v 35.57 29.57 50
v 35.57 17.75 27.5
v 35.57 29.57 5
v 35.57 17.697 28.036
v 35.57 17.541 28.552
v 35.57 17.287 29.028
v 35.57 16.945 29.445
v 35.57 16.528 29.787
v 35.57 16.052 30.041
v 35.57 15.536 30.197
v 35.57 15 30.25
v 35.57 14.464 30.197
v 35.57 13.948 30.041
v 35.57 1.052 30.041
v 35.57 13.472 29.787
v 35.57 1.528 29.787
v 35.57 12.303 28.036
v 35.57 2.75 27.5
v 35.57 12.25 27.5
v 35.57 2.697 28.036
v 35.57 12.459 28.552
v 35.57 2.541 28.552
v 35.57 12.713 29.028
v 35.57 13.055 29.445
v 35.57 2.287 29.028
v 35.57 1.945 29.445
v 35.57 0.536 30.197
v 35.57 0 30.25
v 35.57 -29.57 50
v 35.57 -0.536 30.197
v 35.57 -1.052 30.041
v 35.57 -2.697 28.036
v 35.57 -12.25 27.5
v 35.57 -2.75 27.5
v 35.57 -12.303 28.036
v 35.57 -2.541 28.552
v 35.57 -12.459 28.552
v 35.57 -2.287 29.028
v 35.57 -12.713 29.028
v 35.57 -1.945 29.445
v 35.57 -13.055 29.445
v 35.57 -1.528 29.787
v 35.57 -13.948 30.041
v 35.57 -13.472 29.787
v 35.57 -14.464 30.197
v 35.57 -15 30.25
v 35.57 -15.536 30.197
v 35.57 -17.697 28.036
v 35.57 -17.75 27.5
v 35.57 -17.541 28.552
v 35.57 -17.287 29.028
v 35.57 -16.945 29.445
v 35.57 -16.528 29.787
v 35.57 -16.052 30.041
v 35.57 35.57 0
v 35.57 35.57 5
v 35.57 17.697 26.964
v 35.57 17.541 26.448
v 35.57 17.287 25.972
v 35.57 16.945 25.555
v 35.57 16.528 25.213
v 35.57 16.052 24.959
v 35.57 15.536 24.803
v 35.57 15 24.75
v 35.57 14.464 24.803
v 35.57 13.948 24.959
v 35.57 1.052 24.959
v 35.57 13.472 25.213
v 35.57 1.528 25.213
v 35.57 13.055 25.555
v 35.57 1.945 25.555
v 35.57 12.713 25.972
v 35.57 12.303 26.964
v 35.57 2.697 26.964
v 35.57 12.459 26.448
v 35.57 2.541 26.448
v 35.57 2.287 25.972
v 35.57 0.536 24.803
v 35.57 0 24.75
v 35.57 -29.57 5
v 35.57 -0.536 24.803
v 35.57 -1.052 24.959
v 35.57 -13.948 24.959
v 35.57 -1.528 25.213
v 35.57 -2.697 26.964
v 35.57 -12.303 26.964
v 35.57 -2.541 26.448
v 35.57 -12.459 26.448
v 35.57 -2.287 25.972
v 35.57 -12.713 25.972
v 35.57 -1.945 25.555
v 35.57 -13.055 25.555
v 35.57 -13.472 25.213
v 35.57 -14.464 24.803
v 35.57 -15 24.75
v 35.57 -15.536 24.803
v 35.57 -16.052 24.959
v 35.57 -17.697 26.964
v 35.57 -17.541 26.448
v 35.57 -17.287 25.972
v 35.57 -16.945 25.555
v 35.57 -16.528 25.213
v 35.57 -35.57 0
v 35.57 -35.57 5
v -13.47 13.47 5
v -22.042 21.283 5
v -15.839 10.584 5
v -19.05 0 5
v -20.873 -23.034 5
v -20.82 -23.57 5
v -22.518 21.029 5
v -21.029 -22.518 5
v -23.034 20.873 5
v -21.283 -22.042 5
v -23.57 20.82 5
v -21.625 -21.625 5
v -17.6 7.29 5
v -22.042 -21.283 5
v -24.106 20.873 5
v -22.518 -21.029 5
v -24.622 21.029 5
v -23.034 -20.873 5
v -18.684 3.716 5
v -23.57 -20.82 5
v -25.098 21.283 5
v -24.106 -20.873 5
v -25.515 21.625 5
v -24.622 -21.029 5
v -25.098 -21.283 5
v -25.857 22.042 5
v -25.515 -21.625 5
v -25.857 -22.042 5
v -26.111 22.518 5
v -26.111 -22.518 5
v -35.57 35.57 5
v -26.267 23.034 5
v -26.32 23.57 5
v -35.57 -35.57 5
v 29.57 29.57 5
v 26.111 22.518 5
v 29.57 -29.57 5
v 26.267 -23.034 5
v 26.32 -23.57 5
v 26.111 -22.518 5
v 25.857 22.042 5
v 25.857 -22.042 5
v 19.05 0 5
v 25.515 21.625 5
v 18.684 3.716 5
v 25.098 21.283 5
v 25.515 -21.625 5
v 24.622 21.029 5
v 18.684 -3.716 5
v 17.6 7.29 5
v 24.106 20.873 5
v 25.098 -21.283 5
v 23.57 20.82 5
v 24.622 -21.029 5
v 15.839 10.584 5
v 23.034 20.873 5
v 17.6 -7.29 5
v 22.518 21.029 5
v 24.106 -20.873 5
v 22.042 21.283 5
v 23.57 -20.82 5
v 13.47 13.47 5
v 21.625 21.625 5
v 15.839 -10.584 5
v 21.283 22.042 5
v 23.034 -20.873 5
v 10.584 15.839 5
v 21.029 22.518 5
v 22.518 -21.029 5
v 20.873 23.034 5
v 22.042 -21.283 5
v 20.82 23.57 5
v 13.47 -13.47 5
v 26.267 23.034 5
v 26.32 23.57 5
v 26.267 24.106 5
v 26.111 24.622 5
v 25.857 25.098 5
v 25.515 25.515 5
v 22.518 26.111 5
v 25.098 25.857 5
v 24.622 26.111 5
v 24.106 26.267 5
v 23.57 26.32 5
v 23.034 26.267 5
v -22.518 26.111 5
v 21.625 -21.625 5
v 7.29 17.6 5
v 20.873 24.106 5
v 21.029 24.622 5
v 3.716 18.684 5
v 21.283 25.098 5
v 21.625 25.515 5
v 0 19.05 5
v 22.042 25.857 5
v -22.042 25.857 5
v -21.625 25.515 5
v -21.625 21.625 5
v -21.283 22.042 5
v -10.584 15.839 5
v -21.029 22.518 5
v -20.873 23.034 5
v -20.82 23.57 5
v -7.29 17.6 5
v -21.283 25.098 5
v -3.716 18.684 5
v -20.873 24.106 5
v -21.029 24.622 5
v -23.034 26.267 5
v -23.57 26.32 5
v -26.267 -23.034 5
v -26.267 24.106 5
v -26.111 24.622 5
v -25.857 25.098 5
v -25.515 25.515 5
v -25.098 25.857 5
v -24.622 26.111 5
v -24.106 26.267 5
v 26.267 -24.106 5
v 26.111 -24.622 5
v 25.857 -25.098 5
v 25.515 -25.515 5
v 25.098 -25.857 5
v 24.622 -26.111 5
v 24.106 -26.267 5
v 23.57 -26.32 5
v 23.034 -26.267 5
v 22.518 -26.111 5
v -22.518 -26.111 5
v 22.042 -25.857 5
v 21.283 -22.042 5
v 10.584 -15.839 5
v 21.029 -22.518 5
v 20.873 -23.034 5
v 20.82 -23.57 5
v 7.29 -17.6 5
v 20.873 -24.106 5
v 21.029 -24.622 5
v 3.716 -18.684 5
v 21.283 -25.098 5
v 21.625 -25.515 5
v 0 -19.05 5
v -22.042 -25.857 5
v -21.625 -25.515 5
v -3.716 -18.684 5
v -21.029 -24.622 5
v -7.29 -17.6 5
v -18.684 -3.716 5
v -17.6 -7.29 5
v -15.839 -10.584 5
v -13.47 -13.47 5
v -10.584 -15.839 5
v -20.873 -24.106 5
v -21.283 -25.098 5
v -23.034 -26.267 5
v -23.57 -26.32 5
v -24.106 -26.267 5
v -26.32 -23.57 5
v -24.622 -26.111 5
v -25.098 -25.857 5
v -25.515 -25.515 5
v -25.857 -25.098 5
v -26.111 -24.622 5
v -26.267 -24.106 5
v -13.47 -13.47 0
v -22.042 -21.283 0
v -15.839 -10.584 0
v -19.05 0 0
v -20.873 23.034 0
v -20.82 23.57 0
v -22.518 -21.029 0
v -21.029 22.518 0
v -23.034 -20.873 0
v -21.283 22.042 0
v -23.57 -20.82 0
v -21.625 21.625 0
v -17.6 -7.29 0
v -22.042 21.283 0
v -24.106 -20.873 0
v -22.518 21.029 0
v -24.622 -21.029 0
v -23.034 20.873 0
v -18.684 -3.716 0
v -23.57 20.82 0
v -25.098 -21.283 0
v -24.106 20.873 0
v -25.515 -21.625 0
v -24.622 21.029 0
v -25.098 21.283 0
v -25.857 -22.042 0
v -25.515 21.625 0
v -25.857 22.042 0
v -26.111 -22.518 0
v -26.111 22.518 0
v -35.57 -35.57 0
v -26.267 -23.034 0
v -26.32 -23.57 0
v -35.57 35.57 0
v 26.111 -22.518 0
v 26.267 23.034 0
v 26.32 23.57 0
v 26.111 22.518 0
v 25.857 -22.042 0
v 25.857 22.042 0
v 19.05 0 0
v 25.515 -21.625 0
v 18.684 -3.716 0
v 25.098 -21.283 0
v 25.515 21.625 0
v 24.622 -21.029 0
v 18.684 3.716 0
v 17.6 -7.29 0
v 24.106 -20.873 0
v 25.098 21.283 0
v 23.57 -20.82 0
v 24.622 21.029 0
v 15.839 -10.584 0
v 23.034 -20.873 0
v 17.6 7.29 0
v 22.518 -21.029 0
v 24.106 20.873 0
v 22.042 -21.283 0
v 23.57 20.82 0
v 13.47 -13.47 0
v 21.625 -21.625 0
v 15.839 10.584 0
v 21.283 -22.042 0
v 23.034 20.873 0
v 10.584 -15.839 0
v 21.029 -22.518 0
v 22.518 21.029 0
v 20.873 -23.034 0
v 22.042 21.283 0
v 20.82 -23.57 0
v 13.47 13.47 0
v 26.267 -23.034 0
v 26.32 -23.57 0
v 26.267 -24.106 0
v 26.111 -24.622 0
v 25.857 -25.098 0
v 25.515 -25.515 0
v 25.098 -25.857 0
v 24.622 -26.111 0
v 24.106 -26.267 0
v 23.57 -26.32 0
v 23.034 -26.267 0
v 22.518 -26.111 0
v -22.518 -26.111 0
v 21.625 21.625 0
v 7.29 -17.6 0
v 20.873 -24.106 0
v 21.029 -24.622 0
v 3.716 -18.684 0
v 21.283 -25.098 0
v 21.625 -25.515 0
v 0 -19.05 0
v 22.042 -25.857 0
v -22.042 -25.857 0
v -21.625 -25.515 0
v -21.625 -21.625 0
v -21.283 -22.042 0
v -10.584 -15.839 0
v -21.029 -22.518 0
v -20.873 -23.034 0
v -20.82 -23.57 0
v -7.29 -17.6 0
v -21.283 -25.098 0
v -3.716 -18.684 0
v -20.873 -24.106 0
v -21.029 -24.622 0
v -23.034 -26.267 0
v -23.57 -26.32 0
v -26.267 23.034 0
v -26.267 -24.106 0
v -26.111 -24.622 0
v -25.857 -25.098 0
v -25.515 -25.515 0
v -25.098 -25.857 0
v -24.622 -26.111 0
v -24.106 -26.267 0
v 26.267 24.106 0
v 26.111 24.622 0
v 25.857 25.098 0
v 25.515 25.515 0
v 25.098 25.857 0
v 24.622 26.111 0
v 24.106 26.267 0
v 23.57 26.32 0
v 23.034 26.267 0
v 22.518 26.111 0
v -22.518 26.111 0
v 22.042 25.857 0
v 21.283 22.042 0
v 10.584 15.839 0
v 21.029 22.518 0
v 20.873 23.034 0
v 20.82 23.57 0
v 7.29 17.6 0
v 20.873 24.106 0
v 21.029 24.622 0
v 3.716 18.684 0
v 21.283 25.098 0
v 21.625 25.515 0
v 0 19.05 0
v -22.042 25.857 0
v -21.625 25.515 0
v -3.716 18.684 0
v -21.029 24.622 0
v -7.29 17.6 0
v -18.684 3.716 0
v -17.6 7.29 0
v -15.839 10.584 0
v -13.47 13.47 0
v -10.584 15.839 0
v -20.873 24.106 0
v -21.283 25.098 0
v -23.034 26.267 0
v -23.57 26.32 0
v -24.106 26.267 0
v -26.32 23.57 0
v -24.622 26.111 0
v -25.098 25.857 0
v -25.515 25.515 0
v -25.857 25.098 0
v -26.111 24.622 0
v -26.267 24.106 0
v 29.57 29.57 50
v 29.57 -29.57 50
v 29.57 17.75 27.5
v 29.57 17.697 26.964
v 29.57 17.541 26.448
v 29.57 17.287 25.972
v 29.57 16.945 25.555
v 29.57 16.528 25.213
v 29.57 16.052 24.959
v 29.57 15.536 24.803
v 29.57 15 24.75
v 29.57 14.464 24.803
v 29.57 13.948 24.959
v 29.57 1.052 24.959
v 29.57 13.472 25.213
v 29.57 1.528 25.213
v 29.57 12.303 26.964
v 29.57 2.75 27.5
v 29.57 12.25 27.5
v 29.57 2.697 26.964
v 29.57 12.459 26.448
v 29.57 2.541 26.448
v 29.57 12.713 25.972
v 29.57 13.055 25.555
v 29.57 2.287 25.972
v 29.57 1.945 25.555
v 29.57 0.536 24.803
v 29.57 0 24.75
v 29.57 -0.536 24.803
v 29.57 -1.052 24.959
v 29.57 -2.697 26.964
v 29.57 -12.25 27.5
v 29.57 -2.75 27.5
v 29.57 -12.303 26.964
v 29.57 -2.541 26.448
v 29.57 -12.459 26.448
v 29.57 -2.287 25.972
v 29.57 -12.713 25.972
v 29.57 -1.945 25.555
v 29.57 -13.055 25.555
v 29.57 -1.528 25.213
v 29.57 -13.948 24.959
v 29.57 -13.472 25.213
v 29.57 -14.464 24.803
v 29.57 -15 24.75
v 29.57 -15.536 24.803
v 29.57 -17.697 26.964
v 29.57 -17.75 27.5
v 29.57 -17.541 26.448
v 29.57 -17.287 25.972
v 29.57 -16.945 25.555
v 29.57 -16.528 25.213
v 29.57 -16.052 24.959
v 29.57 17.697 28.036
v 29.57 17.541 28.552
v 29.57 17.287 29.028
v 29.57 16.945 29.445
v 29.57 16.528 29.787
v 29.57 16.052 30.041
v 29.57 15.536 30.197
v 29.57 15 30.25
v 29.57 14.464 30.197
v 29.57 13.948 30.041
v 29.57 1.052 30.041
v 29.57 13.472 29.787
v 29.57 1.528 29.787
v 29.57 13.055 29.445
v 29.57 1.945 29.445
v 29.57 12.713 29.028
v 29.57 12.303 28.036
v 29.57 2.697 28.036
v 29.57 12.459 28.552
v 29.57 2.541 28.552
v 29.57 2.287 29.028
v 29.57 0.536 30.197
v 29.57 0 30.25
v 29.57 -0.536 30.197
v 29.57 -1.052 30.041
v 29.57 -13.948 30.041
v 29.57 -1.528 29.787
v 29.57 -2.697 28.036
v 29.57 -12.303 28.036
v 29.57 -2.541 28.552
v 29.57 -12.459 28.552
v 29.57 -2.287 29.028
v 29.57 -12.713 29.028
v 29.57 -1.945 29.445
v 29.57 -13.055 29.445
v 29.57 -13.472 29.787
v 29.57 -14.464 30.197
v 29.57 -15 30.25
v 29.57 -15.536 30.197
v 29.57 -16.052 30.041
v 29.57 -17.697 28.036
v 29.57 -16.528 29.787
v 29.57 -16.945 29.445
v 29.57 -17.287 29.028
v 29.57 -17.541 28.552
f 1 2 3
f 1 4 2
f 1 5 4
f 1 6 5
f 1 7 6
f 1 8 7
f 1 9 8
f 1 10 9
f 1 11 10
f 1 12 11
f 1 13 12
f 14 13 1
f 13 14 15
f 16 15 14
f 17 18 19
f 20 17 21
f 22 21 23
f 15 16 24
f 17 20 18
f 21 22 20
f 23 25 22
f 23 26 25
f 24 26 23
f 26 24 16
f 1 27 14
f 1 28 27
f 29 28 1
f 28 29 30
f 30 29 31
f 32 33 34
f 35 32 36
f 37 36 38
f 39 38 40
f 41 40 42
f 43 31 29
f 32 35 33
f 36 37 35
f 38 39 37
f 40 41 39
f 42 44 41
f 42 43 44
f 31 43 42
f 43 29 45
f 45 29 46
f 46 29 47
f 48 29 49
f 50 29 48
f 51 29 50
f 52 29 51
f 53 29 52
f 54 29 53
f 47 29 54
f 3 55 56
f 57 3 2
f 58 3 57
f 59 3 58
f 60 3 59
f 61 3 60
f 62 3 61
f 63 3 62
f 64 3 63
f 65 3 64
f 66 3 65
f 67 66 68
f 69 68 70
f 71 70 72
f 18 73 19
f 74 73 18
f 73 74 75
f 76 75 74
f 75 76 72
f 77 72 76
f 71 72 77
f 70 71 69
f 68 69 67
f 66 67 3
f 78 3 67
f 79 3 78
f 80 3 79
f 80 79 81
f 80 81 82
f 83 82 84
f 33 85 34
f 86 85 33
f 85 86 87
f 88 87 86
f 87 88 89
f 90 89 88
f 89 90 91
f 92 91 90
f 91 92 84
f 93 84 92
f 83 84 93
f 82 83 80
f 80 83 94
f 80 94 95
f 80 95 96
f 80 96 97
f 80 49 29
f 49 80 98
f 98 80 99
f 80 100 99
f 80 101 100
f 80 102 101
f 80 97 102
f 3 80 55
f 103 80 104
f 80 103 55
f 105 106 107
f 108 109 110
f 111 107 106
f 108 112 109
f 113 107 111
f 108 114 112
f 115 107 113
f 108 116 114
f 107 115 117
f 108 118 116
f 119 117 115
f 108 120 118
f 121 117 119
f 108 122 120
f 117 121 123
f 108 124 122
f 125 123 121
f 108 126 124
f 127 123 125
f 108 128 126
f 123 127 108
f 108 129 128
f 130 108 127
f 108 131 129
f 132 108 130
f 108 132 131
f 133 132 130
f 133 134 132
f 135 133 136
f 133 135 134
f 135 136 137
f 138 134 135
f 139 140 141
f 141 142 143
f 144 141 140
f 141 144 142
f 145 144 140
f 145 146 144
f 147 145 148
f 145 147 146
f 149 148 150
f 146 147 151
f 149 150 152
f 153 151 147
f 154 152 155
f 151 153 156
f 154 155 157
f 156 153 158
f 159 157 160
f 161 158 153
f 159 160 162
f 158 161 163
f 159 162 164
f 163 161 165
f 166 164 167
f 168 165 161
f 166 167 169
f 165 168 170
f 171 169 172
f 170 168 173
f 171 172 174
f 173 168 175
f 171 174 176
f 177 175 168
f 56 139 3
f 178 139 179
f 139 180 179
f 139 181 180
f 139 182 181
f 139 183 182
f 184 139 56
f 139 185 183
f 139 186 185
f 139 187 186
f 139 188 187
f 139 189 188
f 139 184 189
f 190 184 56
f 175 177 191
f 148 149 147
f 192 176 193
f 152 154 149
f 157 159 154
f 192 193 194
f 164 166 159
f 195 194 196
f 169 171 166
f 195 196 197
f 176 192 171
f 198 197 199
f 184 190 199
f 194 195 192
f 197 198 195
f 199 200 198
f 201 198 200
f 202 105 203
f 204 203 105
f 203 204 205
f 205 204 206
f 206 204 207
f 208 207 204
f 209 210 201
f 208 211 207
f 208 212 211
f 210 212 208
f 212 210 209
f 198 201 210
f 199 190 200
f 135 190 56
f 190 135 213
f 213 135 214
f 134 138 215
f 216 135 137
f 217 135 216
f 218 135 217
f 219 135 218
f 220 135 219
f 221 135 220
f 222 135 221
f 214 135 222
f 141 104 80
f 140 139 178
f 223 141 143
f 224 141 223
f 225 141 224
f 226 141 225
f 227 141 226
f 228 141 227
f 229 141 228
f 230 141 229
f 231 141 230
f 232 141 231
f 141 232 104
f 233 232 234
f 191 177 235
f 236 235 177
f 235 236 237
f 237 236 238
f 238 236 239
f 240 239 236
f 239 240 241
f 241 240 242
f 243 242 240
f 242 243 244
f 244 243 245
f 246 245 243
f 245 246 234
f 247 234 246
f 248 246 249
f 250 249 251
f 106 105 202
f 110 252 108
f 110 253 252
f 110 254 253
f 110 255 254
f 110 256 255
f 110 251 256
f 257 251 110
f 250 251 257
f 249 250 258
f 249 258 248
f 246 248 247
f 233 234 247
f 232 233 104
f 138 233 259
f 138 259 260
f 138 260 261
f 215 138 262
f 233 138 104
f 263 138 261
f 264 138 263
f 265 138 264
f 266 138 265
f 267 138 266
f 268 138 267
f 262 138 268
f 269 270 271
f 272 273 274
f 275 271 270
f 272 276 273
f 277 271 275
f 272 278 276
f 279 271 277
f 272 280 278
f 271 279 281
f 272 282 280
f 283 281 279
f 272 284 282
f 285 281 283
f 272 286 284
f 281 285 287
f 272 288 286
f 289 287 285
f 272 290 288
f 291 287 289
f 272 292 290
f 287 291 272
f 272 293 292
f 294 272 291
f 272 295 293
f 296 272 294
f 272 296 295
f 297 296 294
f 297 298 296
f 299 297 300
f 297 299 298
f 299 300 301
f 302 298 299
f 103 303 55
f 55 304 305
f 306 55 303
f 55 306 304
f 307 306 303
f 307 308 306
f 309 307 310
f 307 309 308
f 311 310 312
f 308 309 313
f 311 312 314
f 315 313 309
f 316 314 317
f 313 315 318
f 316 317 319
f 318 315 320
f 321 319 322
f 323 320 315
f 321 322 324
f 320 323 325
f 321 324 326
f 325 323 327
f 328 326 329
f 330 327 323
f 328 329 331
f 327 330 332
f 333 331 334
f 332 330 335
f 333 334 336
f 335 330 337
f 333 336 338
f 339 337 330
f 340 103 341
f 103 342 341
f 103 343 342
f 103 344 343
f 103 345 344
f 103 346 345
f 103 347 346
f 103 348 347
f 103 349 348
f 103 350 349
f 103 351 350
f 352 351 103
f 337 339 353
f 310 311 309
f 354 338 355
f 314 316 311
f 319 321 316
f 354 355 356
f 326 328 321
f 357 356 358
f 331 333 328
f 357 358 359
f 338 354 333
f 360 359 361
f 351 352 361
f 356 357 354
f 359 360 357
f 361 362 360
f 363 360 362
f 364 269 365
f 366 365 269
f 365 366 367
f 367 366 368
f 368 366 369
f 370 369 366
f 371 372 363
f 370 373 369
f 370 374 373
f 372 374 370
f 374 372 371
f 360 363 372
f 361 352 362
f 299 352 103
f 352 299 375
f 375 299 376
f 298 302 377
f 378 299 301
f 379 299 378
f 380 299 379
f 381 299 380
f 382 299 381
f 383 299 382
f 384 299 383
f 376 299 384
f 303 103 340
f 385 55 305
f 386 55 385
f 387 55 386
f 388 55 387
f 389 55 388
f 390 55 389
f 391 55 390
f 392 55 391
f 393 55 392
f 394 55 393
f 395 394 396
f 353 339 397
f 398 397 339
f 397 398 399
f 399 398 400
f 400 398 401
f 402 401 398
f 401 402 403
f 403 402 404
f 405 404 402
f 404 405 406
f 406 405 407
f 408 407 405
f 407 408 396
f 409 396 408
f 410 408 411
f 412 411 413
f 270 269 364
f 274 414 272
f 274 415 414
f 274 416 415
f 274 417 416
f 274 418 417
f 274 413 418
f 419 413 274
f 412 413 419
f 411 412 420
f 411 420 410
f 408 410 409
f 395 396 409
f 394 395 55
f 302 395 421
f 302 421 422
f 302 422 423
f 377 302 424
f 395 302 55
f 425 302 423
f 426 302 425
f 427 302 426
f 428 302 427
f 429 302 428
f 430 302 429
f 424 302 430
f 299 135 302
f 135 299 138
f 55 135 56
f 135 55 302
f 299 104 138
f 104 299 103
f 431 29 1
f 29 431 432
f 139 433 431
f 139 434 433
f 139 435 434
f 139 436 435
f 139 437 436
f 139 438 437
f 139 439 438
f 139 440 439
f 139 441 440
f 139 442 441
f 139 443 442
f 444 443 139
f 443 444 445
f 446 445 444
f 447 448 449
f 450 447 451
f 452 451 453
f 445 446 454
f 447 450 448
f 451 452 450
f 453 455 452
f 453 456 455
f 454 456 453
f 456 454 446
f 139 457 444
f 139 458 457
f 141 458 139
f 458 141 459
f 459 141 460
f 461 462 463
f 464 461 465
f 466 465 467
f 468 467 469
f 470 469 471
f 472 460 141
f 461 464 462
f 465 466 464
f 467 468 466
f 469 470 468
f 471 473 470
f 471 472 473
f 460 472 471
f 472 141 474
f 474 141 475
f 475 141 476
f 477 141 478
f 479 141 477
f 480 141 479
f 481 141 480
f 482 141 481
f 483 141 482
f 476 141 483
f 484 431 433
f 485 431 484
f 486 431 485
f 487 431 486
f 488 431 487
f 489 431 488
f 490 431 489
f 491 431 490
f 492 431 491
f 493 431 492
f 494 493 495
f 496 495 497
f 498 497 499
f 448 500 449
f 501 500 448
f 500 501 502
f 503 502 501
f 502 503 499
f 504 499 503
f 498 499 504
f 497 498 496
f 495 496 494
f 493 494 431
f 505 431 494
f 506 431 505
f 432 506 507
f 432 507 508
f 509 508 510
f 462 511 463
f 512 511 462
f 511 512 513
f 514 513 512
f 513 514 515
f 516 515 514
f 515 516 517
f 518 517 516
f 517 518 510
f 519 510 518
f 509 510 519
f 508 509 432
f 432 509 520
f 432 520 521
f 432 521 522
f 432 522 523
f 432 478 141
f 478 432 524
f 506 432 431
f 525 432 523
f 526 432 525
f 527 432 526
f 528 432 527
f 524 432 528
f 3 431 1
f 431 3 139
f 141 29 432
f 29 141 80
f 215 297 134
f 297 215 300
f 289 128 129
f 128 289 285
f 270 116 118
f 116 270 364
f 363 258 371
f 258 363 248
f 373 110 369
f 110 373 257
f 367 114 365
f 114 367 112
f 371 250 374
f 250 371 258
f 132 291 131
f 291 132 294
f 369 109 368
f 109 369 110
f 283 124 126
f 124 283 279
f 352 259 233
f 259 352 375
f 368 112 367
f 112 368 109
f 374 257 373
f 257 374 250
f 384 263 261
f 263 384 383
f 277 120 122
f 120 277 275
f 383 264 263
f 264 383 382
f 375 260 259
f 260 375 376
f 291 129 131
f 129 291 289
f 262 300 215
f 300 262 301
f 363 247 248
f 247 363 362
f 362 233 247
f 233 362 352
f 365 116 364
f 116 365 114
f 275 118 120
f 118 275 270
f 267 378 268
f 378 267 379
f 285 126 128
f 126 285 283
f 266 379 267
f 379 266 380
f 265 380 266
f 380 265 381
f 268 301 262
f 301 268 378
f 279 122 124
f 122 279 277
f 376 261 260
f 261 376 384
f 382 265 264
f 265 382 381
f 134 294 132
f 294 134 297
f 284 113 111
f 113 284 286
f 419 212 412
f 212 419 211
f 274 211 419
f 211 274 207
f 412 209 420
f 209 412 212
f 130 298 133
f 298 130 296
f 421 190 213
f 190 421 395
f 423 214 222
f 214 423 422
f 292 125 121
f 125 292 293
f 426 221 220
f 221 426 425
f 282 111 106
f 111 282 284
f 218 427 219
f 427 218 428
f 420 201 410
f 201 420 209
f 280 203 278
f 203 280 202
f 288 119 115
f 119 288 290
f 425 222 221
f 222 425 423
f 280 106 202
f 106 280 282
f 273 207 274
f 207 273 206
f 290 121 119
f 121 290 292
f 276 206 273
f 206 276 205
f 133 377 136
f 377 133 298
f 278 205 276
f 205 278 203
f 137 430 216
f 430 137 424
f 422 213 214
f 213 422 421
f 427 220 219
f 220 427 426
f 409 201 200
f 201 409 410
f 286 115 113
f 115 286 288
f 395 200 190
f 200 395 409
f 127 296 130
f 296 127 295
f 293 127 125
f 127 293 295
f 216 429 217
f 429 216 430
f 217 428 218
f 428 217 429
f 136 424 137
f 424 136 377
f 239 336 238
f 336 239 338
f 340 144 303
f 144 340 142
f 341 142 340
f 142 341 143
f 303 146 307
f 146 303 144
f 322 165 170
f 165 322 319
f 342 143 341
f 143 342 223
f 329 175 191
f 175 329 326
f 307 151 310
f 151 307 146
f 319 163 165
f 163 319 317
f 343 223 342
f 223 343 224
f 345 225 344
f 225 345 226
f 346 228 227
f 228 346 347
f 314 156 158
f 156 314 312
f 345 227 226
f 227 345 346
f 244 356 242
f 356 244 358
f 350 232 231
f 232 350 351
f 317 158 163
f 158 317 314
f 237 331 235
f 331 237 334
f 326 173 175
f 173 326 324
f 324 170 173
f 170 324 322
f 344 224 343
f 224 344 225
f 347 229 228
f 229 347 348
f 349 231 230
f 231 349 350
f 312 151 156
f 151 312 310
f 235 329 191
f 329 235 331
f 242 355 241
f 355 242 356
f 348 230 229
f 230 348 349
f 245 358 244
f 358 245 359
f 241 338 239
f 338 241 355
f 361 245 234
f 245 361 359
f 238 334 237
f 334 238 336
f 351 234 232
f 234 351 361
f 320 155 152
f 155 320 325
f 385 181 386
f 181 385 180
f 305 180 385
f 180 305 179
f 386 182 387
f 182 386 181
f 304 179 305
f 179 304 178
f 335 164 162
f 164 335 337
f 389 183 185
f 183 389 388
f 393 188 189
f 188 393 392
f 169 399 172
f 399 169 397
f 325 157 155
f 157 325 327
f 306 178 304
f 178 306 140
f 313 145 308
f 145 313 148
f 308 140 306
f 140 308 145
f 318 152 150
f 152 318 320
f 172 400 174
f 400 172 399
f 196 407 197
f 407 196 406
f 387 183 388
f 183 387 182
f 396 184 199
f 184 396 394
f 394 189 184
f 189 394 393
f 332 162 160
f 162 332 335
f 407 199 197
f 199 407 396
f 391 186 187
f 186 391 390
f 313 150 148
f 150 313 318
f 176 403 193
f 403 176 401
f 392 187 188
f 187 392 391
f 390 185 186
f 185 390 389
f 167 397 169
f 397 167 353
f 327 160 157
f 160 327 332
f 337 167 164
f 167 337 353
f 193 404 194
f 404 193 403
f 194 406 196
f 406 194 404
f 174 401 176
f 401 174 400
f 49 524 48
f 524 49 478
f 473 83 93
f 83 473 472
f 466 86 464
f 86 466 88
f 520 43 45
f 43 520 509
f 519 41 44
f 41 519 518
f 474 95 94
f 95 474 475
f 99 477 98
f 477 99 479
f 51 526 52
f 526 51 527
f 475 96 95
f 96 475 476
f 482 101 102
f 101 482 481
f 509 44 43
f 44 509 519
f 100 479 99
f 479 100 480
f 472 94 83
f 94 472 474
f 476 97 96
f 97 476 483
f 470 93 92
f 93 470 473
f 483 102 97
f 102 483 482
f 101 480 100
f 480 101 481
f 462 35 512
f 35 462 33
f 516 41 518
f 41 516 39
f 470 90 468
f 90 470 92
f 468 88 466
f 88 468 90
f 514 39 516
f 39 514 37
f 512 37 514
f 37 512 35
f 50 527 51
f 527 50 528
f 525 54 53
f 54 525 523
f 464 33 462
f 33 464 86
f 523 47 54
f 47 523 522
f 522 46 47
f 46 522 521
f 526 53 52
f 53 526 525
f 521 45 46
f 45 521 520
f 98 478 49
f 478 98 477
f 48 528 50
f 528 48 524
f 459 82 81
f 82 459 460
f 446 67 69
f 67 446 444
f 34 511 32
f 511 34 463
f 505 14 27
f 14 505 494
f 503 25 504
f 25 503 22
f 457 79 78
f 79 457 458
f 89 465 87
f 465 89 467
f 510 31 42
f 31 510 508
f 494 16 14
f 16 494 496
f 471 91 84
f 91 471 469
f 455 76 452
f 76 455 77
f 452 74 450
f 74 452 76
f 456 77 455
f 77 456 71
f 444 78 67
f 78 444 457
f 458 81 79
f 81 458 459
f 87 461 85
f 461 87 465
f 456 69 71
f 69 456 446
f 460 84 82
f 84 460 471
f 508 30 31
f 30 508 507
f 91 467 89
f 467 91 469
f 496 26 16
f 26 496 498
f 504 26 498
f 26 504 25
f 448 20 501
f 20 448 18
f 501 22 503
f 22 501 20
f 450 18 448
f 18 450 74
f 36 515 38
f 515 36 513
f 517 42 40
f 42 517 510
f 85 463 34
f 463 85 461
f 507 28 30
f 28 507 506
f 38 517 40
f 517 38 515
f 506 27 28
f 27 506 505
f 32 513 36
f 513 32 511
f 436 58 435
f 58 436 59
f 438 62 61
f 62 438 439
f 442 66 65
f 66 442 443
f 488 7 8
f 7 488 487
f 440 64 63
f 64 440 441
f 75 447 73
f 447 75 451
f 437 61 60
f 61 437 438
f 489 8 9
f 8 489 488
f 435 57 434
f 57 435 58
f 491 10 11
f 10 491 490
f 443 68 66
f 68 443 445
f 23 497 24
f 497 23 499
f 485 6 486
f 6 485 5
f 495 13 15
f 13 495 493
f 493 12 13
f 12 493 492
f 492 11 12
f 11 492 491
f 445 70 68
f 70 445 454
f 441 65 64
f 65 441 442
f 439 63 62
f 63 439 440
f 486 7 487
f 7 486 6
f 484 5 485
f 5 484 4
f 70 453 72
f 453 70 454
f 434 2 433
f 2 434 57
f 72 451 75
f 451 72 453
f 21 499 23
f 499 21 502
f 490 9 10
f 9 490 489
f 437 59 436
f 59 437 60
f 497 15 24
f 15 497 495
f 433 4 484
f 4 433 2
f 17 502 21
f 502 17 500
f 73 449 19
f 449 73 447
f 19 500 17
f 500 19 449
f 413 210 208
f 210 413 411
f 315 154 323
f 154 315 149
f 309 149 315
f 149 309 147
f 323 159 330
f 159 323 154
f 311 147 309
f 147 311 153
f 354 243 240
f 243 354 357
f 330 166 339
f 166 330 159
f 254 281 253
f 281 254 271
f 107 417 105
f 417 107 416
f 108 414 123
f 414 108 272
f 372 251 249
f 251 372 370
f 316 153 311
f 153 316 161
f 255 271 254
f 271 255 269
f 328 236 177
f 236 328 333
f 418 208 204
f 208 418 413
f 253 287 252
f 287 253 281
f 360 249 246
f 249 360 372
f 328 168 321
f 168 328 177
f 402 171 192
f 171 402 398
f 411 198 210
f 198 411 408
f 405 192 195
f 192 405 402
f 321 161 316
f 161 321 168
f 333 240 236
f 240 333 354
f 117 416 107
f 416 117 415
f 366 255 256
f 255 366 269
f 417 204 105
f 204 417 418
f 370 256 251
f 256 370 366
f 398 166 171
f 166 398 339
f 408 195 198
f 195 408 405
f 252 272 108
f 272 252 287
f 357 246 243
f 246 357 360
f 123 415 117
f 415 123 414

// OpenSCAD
$fn = 32;

// ----------------------------------------------------------------------
// Motor mount plate: NEMA23, 71.14 x 71.14 x 55 mm
// ----------------------------------------------------------------------

// --- parameters (mm) ---
mount_w = 71.14;          // plate length, X
mount_d = 71.14;          // plate width, Y
mat_t = 5;                // plate thickness
motor_pitch = 47.14;      // NEMA23 bolt spacing
motor_d = 5.5;            // NEMA23 screw clearance
center_bore = 38.1;       // pilot boss bore
second_d = 5.5;           // second fastener hole
wall_h = 50;              // upright height
wall_t = 6;               // upright thickness

module plate() {
  translate([-mount_w / 2, -mount_d / 2, 0]) cube([mount_w, mount_d, mat_t]);
}

module motor_holes() {
  for (sx = [-1, 1]) for (sy = [-1, 1])
    translate([sx * motor_pitch / 2, sy * motor_pitch / 2, -1])
      cylinder(h = mat_t + 2, d = motor_d);
}
module upright() {
  /* wall sunk 1 mm into the plate for a positive overlap */
  translate([mount_w / 2 - wall_t, -mount_d / 2 + wall_t, mat_t - 1])
    cube([wall_t, mount_d - 2 * wall_t, wall_h - mat_t + 1]);
}

difference() {
  union() {
    plate();
    upright();
  }
  motor_holes();
  translate([0, 0, -1]) cylinder(h = mat_t + 2, d = center_bore);
  for (i = [0 : 2])
    translate([mount_w / 2 - wall_t - 1, (i - 1) * wall_h * 0.3, mat_t + wall_h * 0.45]) rotate([0, 90, 0]) cylinder(h = wall_t + 2, d = second_d);
}
